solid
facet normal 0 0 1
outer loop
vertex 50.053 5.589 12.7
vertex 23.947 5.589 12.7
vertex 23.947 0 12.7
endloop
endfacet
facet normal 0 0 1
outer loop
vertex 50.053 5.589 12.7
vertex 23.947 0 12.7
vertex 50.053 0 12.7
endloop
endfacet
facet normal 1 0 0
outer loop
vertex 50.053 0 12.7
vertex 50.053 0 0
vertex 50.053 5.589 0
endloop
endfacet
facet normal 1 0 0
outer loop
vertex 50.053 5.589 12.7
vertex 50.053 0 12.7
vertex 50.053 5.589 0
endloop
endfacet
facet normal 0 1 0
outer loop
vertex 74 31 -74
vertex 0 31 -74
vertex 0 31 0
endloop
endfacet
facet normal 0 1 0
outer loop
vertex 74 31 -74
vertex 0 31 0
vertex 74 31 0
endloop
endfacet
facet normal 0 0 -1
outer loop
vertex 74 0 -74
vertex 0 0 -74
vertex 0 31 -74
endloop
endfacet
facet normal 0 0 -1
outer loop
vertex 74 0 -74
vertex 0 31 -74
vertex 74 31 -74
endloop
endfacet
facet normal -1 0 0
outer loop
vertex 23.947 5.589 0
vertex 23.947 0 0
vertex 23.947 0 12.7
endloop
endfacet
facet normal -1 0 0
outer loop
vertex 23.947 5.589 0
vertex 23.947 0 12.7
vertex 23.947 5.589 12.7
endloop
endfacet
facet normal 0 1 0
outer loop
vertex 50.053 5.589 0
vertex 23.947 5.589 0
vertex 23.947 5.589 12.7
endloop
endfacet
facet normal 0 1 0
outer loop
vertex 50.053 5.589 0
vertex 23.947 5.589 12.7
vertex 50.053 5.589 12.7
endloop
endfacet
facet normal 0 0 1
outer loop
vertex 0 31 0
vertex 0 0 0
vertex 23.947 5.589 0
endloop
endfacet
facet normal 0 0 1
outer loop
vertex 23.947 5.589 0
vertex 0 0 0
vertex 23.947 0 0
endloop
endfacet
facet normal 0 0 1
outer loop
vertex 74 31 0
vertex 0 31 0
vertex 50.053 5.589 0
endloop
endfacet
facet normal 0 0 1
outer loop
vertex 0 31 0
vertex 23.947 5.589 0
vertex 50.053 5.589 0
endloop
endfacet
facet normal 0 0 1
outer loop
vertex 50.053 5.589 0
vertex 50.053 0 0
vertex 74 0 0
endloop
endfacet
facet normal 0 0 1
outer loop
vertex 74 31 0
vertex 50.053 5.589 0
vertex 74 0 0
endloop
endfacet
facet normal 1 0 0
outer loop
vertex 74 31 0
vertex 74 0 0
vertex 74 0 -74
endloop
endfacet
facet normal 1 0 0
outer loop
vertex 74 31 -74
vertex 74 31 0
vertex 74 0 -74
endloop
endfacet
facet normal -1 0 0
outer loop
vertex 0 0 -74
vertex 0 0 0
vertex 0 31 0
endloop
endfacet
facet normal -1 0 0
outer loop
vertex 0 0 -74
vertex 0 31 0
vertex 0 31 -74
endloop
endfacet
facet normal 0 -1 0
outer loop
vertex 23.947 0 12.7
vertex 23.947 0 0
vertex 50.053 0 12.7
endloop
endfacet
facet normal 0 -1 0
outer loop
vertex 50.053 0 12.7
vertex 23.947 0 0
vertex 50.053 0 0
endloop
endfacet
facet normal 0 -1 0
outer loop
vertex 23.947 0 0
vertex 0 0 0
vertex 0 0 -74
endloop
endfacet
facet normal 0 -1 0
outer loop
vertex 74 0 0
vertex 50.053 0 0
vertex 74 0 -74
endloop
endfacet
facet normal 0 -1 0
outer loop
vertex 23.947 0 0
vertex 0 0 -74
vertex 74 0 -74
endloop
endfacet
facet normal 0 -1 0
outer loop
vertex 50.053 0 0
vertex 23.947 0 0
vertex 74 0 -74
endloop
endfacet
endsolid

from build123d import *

# Parameters (mm, degrees)
SKETCH1_W           = 74
SKETCH1_H           = 74
BOSS_EXTRUDE1_DEPTH = 31
SKETCH2_W           = 26.106590286
SKETCH2_H           = 5.588637075
BOSS_EXTRUDE2_DEPTH = 12.7


with BuildPart() as part:
    # Sketch1 → Boss-Extrude1 (new body)
    with BuildSketch(Plane(origin=(0, 0, 0), x_dir=(1, 0, 0), z_dir=(0, 1, 0))):
        with Locations((37, 37)):
            Rectangle(SKETCH1_W, SKETCH1_H)
    extrude(amount=BOSS_EXTRUDE1_DEPTH)

    # Sketch2 → Boss-Extrude2 (add)
    with BuildSketch(Plane.XY):
        with Locations((37, 2.794318538)):
            Rectangle(SKETCH2_W, SKETCH2_H)
    extrude(amount=BOSS_EXTRUDE2_DEPTH)


solid = part.part
